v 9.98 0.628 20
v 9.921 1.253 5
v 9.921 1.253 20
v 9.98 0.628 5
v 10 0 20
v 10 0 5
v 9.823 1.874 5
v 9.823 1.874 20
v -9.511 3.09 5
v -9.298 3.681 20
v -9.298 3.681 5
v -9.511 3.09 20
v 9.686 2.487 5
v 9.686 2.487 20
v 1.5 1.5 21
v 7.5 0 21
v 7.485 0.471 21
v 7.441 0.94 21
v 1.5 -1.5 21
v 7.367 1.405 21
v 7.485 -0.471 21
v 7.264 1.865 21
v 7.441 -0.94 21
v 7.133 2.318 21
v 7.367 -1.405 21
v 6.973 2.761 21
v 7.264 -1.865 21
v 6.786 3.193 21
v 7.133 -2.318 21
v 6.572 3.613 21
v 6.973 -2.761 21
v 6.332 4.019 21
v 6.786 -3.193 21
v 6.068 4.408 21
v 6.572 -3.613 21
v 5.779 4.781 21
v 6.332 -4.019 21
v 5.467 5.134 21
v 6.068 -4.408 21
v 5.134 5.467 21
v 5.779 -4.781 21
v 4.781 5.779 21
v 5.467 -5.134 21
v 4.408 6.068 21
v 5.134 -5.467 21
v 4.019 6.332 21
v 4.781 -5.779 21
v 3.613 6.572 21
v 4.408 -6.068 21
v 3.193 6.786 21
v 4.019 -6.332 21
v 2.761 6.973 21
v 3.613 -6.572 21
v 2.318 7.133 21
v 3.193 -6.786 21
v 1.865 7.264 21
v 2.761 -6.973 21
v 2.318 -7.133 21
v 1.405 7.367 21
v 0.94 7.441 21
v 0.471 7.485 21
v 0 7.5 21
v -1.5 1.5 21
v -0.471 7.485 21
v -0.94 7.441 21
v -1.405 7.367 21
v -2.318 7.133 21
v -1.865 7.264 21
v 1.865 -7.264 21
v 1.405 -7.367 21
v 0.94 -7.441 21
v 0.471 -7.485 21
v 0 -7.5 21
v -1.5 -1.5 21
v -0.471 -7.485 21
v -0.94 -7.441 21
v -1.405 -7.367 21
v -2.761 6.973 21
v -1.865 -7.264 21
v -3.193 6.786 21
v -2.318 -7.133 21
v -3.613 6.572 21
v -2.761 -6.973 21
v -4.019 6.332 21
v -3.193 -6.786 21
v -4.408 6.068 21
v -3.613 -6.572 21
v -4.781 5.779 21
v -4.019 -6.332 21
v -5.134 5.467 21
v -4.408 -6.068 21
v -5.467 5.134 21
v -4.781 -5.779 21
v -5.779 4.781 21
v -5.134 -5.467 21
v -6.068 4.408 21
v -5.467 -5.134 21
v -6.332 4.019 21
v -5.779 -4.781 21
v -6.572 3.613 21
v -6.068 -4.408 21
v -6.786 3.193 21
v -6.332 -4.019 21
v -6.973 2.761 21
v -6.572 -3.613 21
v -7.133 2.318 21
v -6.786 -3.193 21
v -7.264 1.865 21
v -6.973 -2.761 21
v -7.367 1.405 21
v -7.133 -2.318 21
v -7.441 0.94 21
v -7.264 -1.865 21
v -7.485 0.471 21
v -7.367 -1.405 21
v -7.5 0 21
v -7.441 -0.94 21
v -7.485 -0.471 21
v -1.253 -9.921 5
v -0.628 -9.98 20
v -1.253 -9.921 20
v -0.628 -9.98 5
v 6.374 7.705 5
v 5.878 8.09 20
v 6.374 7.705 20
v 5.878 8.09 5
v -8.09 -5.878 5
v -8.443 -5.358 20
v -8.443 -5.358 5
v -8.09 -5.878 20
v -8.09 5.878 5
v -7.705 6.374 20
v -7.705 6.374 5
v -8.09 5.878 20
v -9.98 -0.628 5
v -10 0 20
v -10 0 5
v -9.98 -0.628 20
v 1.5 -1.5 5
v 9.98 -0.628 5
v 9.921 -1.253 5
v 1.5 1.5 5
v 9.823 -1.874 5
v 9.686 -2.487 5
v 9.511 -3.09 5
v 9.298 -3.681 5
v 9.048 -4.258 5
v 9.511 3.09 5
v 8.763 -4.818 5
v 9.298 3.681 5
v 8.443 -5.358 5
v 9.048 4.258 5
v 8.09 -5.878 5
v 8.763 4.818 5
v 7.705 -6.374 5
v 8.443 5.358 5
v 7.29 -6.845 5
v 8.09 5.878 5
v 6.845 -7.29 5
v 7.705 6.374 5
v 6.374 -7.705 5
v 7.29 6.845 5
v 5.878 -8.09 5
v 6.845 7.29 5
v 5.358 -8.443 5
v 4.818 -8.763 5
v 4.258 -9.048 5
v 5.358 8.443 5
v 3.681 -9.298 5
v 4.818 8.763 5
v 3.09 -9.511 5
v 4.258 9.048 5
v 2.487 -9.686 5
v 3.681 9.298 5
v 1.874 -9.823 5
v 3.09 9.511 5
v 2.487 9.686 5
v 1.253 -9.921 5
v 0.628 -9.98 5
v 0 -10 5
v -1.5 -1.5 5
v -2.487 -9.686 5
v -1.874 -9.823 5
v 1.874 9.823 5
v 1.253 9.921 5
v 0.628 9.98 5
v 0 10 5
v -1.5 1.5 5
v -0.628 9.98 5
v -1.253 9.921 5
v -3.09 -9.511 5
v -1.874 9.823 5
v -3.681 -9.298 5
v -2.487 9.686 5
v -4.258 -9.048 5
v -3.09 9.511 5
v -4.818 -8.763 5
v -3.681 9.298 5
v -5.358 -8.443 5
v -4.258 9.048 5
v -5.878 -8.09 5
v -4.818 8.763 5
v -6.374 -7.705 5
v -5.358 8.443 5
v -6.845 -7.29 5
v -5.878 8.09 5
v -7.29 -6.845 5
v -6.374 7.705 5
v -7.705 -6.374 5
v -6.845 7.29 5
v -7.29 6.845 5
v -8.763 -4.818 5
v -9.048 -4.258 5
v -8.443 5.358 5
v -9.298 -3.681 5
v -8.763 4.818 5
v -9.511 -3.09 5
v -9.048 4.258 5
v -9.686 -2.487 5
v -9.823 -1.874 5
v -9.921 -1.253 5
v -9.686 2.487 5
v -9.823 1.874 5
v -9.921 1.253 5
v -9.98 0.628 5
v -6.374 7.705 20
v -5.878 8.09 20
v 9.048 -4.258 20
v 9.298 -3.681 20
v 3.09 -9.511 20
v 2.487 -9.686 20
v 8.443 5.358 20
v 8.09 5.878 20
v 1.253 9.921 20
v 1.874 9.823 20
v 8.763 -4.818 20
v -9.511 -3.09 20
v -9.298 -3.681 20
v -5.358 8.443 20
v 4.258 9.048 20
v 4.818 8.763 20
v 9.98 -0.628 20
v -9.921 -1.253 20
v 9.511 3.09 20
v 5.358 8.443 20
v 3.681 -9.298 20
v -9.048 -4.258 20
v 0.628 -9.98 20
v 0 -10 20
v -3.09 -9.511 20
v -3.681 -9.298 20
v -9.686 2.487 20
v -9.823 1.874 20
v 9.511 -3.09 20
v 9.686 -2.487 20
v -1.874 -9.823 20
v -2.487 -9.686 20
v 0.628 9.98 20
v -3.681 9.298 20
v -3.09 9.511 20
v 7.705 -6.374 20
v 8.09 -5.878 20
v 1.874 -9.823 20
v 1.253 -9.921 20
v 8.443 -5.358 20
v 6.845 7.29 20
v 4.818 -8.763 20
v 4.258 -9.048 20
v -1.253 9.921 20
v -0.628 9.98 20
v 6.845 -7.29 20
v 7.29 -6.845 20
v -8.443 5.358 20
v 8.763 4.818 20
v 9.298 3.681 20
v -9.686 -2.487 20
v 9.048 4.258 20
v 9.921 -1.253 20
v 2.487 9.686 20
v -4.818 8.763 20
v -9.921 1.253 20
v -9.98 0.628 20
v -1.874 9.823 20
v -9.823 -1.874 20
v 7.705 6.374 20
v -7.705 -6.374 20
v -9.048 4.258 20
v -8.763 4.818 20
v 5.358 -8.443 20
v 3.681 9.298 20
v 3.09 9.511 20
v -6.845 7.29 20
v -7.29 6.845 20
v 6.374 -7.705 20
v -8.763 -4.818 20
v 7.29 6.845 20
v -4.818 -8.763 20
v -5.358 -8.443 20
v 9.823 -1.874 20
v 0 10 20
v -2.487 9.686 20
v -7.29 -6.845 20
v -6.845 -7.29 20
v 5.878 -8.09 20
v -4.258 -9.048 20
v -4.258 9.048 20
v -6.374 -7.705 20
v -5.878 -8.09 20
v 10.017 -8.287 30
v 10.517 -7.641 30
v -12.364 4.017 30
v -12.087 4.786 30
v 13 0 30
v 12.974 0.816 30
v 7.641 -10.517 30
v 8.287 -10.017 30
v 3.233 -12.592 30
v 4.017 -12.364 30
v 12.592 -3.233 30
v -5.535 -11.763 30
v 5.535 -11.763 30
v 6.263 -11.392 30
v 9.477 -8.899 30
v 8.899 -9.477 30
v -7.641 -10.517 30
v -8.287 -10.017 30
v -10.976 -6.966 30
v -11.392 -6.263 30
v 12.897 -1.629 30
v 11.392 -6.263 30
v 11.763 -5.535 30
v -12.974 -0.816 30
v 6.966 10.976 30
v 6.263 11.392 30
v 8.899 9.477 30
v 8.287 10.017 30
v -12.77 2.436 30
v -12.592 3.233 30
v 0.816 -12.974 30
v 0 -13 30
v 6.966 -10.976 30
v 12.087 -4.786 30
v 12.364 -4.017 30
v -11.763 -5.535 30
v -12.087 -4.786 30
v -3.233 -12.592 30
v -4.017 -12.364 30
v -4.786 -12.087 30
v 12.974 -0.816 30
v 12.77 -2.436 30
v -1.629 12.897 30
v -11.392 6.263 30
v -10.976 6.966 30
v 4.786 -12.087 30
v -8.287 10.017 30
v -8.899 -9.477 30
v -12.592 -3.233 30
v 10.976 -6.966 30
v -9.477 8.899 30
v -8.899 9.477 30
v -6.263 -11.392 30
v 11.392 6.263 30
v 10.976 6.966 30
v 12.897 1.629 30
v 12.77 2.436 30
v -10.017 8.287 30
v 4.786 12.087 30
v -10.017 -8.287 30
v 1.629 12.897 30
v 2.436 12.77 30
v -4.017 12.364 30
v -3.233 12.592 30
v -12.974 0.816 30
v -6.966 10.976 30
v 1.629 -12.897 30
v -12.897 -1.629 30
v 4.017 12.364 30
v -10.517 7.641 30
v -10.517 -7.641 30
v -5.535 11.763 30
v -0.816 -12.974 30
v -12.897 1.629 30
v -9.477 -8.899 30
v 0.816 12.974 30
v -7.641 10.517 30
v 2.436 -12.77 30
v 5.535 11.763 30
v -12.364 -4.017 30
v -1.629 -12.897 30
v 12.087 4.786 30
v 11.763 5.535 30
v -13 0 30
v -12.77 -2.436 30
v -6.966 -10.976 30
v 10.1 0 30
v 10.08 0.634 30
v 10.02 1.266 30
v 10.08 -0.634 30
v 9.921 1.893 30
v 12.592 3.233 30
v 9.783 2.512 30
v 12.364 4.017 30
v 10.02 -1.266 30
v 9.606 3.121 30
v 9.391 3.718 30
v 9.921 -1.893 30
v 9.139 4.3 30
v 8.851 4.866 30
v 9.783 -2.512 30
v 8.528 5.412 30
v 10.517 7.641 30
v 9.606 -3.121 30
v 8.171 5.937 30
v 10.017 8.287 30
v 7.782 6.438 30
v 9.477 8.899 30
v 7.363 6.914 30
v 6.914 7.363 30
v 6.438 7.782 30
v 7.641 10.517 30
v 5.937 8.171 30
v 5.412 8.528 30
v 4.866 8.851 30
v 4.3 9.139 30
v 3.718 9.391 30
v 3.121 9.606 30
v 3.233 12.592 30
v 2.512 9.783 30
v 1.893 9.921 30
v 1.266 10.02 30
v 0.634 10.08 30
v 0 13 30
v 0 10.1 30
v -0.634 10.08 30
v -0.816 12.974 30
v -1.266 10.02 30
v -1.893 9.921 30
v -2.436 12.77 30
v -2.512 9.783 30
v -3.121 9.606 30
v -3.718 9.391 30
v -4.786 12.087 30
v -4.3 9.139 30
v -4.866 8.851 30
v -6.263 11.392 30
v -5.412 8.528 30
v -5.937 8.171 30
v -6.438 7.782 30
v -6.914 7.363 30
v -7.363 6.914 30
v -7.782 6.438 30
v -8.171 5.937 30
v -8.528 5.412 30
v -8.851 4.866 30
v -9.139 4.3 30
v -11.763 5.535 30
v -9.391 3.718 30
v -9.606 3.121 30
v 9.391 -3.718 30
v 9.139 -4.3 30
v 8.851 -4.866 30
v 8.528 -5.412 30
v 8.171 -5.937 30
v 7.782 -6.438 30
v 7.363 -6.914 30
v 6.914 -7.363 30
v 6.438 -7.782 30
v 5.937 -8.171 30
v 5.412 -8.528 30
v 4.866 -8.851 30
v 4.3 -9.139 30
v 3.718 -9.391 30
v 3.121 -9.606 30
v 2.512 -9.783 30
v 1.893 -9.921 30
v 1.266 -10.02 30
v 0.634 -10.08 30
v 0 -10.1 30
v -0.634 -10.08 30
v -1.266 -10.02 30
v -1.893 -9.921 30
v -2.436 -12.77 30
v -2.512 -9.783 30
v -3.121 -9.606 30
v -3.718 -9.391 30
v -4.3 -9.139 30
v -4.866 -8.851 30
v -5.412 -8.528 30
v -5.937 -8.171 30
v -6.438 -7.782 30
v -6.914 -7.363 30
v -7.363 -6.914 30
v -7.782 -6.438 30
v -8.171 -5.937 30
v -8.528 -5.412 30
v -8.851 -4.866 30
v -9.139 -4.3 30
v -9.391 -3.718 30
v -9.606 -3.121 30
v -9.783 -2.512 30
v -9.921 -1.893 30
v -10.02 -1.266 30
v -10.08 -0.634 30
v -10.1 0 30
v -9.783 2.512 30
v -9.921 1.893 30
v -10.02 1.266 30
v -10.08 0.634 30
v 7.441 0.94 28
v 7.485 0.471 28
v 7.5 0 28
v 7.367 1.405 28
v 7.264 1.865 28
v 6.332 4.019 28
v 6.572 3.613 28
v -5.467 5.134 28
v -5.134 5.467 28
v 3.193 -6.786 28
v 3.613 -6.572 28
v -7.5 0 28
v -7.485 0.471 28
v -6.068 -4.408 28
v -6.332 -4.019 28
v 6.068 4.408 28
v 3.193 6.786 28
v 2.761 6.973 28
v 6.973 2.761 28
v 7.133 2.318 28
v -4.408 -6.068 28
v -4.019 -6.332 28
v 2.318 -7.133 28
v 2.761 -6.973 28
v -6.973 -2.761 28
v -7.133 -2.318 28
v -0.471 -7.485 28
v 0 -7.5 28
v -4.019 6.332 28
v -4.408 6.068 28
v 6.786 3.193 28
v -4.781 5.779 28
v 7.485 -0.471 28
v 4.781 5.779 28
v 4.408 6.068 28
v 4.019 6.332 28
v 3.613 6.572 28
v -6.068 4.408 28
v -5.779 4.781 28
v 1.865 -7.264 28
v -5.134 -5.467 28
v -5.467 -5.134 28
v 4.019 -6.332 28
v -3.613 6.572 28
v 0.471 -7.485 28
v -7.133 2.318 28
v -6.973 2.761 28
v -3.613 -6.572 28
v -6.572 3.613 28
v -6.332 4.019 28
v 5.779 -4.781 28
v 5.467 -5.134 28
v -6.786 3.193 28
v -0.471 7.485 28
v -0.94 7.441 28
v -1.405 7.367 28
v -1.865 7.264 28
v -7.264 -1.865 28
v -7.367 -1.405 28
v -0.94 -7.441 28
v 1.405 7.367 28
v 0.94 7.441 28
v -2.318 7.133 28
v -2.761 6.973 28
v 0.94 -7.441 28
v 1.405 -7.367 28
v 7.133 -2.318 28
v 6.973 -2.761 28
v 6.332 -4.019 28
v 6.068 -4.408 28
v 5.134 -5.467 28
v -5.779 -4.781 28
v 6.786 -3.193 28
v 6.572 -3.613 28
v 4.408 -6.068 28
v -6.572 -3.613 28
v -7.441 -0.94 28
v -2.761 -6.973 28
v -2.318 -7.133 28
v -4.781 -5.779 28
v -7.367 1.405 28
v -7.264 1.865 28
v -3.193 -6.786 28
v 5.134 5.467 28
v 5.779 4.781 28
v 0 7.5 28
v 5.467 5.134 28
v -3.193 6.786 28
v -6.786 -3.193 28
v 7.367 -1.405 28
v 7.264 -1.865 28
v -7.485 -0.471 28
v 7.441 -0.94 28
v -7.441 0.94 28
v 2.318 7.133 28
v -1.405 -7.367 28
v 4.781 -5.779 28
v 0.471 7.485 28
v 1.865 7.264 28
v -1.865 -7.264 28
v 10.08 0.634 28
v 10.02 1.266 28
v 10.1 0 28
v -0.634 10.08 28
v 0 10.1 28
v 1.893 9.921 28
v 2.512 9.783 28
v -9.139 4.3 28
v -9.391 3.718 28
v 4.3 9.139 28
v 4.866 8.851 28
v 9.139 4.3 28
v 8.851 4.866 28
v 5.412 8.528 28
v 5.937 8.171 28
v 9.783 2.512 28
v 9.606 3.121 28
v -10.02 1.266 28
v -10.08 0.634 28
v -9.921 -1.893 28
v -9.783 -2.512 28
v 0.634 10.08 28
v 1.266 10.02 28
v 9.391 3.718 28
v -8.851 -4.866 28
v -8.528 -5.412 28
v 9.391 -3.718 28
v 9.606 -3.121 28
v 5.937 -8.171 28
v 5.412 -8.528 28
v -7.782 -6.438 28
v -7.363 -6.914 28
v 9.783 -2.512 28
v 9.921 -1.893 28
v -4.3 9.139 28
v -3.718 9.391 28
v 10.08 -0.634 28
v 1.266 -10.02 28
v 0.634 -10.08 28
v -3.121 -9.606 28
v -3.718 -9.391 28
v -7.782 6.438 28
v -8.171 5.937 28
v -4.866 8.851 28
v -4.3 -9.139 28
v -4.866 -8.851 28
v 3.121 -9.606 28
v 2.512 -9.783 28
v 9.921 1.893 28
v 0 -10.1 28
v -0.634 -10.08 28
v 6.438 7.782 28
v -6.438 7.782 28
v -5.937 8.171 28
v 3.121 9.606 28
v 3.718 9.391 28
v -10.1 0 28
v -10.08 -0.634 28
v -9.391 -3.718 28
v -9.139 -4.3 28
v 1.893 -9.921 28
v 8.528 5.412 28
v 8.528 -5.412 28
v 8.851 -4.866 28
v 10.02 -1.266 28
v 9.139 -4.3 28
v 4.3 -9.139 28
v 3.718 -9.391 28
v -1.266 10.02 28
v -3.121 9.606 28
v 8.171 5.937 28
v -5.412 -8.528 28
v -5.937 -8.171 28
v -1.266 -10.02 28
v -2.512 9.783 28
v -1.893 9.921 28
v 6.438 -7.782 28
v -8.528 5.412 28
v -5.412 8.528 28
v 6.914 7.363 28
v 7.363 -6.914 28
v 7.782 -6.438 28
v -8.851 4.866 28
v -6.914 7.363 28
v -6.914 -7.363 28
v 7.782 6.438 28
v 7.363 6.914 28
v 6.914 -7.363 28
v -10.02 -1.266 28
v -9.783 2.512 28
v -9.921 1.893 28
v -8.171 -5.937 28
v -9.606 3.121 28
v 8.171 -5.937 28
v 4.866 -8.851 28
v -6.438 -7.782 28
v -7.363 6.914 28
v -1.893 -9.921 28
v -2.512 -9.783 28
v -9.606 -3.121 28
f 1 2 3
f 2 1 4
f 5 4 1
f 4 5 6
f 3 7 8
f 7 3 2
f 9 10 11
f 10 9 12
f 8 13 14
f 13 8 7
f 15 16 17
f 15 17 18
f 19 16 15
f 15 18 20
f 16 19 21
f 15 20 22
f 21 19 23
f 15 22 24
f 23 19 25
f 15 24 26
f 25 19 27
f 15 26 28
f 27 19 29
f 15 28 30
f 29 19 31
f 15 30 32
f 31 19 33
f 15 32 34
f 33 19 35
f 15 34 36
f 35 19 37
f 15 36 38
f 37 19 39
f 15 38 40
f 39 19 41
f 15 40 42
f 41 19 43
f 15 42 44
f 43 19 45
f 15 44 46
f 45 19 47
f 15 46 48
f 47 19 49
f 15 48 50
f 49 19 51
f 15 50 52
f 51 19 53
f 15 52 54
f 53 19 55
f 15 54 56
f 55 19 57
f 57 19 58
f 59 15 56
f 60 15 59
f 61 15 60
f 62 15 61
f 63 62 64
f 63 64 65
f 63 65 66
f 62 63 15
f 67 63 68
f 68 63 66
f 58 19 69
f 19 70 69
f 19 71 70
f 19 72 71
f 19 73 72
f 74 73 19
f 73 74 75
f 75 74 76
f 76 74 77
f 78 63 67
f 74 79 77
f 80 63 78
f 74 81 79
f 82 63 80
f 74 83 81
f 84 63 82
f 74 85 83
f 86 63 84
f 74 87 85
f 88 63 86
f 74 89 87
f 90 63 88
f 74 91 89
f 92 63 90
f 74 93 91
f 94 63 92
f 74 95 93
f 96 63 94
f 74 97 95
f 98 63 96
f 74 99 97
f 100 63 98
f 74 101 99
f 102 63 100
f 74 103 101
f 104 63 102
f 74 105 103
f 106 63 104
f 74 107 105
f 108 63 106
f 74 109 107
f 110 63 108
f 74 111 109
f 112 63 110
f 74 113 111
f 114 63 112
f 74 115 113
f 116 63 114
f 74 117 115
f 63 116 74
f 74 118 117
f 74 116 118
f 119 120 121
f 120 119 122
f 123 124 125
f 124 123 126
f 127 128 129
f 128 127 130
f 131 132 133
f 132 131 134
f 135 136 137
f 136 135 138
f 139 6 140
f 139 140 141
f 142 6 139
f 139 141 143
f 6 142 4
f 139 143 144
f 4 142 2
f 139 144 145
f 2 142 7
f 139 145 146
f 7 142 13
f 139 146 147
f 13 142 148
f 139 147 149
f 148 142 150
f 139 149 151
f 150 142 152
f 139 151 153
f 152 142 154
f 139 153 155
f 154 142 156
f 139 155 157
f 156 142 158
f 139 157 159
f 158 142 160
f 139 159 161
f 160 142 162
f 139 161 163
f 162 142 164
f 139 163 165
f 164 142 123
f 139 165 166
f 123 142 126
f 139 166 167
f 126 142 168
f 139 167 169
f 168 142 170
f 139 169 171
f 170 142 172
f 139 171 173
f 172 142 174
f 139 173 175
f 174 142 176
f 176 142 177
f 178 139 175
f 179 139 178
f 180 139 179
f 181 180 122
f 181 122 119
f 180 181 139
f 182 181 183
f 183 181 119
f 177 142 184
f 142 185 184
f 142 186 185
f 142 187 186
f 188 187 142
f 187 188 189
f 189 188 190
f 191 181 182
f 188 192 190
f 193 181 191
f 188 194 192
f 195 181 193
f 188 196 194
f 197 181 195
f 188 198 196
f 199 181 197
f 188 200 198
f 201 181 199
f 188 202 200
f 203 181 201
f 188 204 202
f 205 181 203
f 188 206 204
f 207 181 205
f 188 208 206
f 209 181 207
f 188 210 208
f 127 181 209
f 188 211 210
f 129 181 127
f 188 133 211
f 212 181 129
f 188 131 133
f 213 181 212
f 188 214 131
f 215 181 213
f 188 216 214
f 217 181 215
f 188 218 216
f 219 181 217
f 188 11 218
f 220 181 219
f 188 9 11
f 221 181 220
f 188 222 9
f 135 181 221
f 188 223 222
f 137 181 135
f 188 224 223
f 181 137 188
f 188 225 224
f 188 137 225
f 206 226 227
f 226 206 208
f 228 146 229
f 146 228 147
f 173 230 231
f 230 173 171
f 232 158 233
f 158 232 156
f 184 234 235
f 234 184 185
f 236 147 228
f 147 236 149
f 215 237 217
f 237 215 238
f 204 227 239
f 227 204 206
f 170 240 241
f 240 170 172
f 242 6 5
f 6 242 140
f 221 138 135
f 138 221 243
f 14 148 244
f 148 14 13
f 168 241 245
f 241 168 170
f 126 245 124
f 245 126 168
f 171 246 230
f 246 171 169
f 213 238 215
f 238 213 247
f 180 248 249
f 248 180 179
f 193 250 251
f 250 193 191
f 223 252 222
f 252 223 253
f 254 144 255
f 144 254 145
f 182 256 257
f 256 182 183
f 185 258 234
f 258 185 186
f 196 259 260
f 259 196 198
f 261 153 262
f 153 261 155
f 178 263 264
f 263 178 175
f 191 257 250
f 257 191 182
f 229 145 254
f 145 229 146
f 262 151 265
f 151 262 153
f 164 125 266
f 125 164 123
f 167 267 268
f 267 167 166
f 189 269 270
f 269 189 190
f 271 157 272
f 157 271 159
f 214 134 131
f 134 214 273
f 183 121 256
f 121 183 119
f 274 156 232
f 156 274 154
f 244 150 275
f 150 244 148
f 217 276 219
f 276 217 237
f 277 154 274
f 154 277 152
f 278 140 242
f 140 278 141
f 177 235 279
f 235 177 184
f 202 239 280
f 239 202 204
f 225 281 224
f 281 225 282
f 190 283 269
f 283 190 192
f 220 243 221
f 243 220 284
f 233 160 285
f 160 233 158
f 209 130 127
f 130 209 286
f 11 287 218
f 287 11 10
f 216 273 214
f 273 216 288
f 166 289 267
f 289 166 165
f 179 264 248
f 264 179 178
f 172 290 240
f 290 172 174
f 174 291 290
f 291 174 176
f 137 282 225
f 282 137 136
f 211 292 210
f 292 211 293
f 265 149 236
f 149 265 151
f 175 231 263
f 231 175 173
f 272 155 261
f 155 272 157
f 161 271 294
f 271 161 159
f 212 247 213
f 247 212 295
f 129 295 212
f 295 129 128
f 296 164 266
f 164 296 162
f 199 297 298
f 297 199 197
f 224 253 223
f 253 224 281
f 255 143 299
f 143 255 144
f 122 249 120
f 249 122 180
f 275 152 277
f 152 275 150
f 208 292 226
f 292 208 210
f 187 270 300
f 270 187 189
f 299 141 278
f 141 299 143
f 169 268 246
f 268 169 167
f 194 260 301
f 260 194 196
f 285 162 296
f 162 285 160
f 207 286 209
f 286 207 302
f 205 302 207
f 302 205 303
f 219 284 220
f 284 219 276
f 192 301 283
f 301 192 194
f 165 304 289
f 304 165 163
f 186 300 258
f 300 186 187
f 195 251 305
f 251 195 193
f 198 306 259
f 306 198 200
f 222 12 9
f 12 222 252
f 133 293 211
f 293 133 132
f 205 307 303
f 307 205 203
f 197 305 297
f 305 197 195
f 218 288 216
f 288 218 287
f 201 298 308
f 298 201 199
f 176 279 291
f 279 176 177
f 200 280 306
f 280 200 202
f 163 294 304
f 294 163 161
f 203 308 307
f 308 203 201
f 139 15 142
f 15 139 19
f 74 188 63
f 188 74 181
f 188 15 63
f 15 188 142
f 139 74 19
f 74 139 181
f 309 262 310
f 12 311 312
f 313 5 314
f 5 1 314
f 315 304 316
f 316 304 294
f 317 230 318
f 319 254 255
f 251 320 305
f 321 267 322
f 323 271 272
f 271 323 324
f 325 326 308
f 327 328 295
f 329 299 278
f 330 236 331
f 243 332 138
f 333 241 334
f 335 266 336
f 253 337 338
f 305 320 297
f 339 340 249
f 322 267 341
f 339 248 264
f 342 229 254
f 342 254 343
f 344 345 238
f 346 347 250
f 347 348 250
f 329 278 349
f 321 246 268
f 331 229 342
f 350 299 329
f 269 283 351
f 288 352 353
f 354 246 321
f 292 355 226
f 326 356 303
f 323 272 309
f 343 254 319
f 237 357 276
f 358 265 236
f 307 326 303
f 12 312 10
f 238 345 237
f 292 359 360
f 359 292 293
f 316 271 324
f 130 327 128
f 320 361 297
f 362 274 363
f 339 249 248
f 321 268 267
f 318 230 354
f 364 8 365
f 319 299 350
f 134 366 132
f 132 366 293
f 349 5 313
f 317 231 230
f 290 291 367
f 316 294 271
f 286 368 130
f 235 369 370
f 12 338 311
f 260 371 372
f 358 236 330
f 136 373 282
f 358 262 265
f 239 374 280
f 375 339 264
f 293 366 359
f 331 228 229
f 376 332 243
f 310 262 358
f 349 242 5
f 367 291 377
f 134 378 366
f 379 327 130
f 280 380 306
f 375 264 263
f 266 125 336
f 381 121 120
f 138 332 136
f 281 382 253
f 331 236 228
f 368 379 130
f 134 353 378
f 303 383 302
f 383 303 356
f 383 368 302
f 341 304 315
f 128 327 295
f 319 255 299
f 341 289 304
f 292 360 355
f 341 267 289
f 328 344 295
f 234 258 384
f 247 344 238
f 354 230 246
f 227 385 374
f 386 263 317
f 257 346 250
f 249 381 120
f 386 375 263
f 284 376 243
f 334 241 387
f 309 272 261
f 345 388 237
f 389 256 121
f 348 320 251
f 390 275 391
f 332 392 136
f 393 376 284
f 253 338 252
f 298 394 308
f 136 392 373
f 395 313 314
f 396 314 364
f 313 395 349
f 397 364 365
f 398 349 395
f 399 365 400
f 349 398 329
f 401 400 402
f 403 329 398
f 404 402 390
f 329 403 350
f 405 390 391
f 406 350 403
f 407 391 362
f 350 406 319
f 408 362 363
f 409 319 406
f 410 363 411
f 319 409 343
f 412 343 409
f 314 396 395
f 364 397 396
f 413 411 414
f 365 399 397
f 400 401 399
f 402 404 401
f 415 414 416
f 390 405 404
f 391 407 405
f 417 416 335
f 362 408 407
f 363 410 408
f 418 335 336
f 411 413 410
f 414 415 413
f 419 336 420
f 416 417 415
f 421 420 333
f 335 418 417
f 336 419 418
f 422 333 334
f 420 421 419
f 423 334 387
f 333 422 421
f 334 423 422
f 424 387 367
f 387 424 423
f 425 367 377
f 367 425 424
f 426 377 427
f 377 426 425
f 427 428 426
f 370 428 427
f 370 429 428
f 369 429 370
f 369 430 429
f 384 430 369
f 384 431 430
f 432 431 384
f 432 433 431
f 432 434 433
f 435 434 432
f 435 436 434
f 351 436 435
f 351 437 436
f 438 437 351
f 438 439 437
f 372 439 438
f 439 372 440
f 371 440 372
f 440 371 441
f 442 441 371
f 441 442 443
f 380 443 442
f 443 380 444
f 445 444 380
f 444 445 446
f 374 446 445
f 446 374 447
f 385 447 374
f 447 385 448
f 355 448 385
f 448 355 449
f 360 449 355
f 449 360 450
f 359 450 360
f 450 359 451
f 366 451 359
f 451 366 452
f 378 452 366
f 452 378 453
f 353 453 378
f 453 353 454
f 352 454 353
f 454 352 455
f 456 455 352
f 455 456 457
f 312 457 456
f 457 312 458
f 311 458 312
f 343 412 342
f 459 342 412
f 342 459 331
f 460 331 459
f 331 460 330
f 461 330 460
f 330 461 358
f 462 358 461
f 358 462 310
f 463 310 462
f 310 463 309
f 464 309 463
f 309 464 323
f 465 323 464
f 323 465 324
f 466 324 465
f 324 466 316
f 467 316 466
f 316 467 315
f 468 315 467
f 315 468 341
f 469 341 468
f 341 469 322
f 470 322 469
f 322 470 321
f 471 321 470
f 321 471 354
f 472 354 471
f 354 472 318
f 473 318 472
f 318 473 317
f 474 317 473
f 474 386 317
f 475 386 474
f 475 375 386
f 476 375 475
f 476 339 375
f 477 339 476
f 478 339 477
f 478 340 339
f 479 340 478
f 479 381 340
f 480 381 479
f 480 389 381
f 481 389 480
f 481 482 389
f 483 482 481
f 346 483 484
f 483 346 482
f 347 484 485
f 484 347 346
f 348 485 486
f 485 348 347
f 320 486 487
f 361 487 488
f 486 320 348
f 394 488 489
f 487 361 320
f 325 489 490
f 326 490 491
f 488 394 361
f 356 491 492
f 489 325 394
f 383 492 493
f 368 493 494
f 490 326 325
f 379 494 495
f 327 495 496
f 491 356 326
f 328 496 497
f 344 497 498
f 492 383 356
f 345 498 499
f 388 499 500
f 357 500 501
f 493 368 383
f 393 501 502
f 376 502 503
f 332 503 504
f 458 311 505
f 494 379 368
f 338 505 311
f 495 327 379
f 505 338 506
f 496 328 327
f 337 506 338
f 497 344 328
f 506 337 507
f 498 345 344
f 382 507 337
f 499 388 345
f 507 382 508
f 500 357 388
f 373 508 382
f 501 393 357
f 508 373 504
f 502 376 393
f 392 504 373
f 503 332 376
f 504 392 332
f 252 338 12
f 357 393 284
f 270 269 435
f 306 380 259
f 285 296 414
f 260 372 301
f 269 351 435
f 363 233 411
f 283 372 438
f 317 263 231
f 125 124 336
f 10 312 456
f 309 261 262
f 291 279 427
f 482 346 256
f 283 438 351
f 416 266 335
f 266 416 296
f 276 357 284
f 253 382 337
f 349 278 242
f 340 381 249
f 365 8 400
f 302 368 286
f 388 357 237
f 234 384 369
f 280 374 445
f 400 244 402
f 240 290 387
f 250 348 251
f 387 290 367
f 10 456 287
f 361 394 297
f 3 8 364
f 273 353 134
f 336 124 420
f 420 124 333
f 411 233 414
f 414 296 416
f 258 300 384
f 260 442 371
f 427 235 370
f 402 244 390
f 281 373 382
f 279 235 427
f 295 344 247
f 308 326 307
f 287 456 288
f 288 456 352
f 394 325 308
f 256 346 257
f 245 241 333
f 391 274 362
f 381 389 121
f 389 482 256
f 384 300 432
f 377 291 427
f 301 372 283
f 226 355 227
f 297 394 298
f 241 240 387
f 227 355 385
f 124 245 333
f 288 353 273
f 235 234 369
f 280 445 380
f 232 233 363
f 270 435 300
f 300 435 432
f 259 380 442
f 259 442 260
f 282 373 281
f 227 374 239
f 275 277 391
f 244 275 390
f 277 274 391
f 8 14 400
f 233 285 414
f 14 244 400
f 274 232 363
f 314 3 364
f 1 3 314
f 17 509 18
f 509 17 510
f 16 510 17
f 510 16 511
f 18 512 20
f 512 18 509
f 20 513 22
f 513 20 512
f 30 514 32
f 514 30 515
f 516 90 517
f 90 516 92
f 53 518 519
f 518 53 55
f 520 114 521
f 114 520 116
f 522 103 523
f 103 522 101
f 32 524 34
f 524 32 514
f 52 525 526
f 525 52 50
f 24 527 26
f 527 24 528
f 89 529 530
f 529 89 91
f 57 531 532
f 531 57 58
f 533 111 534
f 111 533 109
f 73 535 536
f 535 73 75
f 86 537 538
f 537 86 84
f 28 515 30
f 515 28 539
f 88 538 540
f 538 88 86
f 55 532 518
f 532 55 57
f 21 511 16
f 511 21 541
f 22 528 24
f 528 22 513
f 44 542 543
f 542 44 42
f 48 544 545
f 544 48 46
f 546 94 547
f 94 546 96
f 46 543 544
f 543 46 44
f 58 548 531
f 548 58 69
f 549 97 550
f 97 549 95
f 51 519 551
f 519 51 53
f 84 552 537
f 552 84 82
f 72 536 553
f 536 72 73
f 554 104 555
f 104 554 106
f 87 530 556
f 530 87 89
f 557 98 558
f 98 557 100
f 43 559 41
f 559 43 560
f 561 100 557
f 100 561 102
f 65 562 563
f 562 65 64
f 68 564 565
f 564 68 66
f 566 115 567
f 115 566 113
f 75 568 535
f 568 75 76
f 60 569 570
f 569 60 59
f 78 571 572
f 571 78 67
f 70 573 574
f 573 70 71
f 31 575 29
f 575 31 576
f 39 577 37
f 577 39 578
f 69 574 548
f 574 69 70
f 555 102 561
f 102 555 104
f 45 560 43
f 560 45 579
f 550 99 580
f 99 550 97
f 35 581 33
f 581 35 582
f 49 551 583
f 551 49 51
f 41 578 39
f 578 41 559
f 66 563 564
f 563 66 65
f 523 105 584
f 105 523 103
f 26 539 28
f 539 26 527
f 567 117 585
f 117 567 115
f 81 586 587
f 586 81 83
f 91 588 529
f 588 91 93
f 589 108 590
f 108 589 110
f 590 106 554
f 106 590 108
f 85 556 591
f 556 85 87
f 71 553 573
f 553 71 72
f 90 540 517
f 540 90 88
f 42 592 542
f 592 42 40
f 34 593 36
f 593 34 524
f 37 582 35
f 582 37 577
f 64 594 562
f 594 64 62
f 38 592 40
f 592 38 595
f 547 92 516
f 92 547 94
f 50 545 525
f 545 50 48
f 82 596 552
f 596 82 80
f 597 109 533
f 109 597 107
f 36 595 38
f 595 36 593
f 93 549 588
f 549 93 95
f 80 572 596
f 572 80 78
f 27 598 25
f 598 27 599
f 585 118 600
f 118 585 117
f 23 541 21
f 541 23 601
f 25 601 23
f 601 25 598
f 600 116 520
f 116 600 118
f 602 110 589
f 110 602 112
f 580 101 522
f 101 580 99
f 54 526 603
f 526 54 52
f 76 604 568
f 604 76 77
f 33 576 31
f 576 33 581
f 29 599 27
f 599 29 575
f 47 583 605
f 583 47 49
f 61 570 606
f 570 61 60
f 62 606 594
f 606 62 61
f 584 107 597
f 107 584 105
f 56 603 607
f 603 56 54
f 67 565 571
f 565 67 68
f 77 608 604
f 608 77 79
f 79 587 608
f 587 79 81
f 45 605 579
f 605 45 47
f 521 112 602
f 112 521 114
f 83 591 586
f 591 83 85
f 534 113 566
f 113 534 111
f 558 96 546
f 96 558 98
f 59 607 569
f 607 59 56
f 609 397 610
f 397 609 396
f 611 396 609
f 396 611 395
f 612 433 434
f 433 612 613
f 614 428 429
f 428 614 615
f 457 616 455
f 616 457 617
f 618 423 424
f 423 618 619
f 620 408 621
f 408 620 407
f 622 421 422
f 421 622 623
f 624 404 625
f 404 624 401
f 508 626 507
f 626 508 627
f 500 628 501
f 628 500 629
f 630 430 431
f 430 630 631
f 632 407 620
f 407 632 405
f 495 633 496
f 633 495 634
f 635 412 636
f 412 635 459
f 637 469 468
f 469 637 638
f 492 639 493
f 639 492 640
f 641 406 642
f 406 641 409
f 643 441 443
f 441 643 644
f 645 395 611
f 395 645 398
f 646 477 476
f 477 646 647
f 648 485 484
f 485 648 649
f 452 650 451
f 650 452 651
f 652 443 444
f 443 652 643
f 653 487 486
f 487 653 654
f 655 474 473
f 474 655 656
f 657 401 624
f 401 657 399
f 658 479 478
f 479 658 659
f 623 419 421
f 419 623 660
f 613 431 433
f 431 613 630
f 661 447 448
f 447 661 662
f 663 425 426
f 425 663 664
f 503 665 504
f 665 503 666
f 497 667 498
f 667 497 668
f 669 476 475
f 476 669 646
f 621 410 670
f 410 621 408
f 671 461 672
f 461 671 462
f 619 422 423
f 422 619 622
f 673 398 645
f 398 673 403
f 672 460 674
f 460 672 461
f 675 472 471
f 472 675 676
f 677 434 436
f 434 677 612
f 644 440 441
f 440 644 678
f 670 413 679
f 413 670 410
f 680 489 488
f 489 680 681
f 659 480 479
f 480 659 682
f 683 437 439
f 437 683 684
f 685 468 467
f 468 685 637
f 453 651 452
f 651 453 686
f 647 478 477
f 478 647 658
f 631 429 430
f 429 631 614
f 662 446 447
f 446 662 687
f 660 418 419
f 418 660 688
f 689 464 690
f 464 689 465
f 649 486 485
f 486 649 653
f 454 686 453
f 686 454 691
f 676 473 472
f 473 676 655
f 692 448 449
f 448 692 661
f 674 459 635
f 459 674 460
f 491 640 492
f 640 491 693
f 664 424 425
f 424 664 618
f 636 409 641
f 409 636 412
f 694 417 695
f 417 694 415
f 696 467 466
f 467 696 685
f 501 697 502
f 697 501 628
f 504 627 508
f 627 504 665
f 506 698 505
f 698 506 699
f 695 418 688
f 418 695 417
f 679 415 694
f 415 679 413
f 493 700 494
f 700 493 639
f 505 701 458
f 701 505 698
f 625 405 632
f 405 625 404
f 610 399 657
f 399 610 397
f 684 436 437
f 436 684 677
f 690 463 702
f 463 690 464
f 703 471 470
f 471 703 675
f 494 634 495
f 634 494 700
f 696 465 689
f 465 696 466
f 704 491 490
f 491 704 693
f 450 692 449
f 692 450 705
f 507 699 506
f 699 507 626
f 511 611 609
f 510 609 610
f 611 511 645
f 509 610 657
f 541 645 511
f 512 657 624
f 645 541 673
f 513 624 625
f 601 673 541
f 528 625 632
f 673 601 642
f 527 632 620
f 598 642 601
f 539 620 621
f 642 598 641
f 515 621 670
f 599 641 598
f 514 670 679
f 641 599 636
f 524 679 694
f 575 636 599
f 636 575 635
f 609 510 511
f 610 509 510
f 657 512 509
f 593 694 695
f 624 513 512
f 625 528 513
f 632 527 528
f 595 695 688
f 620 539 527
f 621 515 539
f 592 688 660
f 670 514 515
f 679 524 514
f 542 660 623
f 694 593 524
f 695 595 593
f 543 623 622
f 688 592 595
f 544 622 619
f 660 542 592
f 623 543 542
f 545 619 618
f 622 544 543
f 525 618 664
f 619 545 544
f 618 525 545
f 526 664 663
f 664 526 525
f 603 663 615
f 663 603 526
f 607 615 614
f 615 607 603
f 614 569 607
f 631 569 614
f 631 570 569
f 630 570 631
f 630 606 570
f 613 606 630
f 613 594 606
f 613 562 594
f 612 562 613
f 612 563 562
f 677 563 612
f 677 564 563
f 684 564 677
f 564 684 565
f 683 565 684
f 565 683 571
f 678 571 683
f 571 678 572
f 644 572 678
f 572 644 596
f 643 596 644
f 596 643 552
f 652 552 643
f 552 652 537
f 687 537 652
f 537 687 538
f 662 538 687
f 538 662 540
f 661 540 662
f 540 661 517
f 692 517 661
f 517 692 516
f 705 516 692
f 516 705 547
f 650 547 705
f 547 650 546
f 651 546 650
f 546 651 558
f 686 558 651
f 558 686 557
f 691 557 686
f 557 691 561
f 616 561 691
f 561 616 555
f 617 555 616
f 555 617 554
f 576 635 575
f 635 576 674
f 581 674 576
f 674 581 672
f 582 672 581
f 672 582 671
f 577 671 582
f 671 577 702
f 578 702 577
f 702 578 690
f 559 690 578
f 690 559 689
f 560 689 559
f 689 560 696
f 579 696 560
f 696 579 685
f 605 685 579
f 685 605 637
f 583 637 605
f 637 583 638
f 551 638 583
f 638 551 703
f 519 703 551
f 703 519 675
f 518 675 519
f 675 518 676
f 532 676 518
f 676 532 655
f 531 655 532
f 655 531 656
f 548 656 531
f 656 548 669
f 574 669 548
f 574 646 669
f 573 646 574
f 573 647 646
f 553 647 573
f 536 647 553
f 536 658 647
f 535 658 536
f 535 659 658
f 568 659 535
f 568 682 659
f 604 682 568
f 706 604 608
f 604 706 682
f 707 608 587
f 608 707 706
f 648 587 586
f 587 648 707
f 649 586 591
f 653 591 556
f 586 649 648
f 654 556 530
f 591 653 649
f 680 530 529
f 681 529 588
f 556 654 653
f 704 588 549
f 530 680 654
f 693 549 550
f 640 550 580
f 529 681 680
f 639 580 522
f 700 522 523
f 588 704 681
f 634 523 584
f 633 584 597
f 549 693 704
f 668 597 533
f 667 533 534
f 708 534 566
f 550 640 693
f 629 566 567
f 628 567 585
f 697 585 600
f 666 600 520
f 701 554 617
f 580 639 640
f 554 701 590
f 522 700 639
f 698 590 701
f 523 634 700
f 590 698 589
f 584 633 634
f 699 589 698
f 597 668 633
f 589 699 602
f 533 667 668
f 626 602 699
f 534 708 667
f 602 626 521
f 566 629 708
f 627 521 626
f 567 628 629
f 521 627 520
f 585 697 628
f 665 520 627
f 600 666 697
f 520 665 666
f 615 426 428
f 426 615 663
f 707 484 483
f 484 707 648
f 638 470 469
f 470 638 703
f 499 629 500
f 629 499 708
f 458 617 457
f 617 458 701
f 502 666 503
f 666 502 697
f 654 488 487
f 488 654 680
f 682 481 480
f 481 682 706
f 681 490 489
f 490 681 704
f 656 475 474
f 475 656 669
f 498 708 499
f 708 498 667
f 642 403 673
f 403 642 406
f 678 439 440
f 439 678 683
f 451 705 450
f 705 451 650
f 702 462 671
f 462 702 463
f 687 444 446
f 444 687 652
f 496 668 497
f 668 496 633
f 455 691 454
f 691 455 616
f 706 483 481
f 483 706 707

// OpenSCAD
// C-EGG Antriebsteile 3D Druck


difference() {
  translate([0,0,5]) cylinder(h=16, r=10, $fn=100);
  translate([-1.5,-1.5,-1]) cube([3,3,25]);
}


difference() {
  translate([0,0,20]) cylinder(h=10, r2=13, r1=10, $fn=100);
  translate([0,0,19]) cylinder(h=12, r=7.5,$fn=100);
  translate([0,0,28]) cylinder(h=10, r=10.1,$fn=100);
}
